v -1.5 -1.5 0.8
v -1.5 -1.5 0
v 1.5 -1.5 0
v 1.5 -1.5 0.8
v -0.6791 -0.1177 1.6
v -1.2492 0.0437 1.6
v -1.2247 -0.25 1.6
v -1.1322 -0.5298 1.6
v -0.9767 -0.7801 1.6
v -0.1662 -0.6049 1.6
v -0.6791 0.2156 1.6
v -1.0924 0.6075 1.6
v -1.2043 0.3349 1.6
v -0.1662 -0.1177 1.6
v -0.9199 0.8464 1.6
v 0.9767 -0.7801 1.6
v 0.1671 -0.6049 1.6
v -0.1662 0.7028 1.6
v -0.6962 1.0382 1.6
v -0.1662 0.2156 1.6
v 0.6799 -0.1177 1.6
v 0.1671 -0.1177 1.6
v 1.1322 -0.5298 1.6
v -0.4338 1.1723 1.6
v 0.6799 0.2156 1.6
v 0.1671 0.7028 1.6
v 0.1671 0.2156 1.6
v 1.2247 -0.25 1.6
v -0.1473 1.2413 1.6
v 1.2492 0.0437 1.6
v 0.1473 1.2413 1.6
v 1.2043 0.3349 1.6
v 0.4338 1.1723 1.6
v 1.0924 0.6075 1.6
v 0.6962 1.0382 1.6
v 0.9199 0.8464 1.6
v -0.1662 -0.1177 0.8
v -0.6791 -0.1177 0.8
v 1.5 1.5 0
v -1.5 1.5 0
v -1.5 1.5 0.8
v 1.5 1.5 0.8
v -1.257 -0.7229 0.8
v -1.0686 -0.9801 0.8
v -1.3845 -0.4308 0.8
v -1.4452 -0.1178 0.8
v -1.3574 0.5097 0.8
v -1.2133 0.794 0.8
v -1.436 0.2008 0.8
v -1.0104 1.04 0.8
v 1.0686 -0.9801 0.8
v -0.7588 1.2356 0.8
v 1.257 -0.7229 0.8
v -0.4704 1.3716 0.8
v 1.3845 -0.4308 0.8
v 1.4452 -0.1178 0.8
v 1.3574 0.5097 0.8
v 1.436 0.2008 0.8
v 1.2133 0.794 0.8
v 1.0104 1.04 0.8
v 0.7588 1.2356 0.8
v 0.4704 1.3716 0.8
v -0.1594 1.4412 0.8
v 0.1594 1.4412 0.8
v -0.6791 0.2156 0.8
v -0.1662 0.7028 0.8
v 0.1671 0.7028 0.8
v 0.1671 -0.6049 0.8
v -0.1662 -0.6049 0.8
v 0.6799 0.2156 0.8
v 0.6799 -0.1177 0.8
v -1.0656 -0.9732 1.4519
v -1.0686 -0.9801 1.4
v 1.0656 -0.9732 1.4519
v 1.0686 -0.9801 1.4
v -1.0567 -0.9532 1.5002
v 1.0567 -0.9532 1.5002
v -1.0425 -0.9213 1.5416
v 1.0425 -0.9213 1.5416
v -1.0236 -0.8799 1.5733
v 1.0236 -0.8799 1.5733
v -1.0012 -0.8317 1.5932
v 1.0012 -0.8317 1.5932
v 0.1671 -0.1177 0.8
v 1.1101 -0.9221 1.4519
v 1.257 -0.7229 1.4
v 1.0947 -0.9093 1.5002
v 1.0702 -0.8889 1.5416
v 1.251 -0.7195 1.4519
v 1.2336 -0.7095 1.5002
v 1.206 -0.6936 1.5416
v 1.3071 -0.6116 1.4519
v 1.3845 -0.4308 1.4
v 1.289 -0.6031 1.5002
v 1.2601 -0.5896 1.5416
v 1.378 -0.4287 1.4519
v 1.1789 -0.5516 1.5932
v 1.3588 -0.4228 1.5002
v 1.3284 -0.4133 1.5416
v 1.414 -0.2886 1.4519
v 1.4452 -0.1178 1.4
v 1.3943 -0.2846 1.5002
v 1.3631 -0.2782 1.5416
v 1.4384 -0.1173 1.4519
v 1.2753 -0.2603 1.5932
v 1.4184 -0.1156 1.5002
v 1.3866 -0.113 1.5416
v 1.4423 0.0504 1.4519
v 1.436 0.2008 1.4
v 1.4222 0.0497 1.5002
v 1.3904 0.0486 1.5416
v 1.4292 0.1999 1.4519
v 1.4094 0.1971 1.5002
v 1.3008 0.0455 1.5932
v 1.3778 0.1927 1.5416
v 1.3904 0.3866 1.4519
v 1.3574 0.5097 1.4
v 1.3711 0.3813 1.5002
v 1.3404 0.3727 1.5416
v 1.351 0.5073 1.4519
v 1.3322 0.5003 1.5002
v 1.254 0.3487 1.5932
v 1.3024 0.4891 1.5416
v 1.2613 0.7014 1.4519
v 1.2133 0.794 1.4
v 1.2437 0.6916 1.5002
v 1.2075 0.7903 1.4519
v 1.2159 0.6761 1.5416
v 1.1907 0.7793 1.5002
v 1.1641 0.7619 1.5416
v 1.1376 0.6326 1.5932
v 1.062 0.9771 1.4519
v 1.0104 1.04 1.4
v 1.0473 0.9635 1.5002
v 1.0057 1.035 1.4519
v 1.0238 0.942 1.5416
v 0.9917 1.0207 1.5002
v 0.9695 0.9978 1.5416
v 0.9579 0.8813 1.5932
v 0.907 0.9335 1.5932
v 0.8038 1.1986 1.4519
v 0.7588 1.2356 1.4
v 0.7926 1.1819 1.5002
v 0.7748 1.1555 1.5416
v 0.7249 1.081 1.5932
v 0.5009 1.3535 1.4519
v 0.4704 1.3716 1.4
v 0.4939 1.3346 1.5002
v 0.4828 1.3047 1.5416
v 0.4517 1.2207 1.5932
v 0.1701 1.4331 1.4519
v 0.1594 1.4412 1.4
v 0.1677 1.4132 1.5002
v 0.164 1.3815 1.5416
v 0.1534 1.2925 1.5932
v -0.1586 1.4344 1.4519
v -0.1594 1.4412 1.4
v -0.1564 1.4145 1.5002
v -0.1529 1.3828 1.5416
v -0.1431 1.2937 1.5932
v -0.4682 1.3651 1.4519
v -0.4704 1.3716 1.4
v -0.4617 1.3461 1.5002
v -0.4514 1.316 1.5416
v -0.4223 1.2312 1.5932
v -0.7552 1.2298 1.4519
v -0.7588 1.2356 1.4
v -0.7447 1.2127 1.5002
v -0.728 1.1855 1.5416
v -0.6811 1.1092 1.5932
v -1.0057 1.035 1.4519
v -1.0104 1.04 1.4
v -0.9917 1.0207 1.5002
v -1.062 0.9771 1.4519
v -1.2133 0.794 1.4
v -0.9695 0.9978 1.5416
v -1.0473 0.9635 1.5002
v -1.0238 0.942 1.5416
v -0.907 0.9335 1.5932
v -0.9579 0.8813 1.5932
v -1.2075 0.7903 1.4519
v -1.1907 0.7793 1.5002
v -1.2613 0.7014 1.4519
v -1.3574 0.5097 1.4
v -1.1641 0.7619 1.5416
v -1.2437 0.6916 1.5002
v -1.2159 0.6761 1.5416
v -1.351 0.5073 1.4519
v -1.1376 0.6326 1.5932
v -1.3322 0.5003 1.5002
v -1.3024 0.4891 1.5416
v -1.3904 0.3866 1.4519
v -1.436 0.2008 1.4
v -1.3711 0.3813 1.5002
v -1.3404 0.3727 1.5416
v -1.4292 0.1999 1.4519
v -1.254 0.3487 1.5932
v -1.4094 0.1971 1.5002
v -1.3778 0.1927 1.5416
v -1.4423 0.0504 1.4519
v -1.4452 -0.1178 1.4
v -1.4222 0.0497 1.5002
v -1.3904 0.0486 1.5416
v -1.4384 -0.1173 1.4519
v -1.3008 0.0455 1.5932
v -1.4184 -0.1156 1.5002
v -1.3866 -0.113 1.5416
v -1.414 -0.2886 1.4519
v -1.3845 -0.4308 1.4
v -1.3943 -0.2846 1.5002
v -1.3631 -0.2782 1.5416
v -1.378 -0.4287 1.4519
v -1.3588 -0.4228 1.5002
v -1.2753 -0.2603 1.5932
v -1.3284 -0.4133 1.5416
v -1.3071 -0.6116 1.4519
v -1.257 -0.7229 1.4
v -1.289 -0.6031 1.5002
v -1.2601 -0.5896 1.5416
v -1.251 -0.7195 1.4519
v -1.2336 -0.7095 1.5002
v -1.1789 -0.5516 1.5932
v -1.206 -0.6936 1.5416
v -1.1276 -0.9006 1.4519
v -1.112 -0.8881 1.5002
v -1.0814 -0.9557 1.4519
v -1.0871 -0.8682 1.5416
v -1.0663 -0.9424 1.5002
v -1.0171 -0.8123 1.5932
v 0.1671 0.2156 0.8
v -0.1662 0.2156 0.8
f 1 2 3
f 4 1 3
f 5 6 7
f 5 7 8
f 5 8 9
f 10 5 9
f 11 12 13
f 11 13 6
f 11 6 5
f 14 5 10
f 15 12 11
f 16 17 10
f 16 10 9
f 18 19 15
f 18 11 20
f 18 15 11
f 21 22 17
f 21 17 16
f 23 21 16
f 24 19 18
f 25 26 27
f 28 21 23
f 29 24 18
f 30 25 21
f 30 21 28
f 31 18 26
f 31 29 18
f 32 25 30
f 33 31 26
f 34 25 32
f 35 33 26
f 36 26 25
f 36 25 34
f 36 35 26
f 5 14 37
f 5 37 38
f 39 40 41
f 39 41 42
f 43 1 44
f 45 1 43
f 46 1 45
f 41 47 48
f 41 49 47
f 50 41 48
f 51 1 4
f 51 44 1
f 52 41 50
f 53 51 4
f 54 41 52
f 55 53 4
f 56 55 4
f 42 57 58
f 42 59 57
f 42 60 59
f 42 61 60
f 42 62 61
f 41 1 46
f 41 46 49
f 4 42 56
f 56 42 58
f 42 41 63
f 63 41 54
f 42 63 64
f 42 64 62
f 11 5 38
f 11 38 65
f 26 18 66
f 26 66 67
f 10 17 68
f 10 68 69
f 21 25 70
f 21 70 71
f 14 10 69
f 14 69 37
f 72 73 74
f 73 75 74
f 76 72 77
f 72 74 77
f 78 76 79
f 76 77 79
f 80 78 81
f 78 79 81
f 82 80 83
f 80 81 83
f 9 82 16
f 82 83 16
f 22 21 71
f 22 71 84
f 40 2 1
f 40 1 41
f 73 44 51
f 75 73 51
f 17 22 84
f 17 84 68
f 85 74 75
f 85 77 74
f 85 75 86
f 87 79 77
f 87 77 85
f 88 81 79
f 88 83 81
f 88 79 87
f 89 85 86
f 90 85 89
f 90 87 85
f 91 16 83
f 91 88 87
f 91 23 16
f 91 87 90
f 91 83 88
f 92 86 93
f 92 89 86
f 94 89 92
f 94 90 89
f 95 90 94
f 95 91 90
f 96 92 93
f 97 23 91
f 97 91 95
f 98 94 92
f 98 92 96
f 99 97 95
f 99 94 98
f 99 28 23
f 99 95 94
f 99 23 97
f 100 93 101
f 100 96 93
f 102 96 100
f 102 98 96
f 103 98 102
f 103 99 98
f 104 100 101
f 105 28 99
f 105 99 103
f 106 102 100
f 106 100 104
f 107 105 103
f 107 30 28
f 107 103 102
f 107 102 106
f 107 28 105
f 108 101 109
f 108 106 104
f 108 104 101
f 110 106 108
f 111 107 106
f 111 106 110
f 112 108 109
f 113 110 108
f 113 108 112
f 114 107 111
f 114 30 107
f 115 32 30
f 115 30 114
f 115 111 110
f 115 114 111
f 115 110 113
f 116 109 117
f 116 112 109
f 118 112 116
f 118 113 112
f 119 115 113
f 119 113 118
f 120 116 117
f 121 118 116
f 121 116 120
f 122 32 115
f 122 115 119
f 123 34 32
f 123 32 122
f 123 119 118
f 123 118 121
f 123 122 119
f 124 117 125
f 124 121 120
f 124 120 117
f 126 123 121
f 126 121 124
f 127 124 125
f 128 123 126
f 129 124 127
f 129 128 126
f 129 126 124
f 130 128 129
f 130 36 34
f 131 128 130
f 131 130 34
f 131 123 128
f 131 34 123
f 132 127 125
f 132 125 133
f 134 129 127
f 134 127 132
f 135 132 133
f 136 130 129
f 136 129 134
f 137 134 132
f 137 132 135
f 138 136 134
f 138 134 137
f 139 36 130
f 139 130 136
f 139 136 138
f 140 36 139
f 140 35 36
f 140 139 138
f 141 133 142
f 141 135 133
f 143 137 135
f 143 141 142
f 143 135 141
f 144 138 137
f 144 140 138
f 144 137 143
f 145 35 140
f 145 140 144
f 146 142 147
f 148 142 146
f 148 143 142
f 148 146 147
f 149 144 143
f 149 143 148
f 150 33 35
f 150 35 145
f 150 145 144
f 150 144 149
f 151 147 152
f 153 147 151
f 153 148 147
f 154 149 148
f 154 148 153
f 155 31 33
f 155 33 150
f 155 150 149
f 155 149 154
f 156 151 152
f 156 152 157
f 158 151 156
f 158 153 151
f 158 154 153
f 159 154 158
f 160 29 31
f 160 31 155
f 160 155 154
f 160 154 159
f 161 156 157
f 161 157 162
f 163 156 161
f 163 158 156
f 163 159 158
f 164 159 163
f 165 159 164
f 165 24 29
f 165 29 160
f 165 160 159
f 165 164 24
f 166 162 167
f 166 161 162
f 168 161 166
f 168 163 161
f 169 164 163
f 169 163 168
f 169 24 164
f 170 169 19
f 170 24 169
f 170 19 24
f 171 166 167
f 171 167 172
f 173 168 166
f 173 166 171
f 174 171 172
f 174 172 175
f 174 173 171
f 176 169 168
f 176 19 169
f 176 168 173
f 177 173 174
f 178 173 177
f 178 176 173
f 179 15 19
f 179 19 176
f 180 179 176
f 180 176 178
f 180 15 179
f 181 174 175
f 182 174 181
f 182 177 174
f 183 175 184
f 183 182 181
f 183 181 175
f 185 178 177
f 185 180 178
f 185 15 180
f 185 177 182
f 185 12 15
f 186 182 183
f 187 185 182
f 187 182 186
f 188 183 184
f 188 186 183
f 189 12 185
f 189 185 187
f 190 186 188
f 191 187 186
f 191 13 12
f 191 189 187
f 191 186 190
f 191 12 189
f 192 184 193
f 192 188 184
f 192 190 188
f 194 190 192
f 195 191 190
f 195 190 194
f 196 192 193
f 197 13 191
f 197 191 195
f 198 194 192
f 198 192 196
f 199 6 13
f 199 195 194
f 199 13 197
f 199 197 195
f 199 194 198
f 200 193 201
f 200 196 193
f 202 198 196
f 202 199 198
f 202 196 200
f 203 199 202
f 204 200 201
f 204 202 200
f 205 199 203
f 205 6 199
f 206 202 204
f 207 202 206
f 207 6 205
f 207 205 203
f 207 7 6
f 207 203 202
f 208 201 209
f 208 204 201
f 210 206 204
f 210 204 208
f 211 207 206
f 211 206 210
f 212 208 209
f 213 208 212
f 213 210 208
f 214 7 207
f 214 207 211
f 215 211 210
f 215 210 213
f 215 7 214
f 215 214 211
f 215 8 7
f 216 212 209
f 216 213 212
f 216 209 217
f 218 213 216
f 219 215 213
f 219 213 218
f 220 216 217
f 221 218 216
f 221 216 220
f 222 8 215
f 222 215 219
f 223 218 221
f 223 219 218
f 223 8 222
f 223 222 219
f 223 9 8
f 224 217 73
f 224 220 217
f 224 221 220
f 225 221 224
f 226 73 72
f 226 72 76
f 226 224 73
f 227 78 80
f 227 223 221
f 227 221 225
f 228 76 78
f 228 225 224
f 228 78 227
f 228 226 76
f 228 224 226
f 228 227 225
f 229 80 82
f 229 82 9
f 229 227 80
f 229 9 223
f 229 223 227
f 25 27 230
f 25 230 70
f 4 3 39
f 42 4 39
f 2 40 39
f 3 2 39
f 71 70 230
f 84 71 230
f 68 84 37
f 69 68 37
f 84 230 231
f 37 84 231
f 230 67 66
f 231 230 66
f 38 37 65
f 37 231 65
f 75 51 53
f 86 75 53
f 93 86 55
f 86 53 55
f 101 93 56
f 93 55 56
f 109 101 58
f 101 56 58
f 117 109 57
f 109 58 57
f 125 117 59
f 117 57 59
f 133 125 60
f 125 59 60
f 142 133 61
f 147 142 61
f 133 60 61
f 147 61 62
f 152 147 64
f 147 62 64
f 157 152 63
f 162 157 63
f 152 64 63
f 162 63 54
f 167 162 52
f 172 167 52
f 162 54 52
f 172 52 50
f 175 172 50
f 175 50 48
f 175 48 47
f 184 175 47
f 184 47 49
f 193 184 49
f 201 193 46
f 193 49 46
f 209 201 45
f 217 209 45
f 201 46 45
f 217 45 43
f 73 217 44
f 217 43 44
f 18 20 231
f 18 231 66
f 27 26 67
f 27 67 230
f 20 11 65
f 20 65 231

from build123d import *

# Parameters (mm, degrees)
SKETCH1_W           = 3
SKETCH1_H           = 3
BOSS_EXTRUDE1_DEPTH = 0.8
BOSS_EXTRUDE2_DEPTH = 0.8
CUT_EXTRUDE1_DEPTH  = 0.8
FILLET1_R           = 0.2


with BuildPart() as part:
    # Sketch1 → Boss-Extrude1 (new body)
    with BuildSketch(Plane.XY):
        Rectangle(SKETCH1_W, SKETCH1_H)
    extrude(amount=BOSS_EXTRUDE1_DEPTH)

    # Sketch2 → Boss-Extrude2 (add)
    with BuildSketch(Plane.XY.offset(0.8)):
        with BuildLine():
            Line((-1.068624141, -0.980072674), (1.068624141, -0.980072674))
            ThreePointArc((1.068624141, -0.980072674), (0, 1.45), (-1.068624141, -0.980072674))
        make_face()
    extrude(amount=BOSS_EXTRUDE2_DEPTH)

    # Sketch3 → Cut-Extrude1 (cut)
    with BuildSketch(Plane.XY.offset(1.6)):
        Polygon((-0.166229868, 0.215595899), (-0.166229868, 0.702775387), (0.167103465, 0.702775387), (0.167103465, 0.215595899), (0.679923978, 0.215595899), (0.679923978, -0.117737434), (0.167103465, -0.117737434), (0.167103465, -0.604916921), (-0.166229868, -0.604916921), (-0.166229868, -0.117737434), (-0.679050381, -0.117737434), (-0.679050381, 0.215595899), align=None)
    extrude(amount=-CUT_EXTRUDE1_DEPTH, mode=Mode.SUBTRACT)

    # Fillet1
    fillet1_edges = [part.edges().sort_by_distance(p)[0] for p in [
        (0, 1.45, 1.6),
        (0, -0.980072674, 1.6),
    ]]
    fillet(fillet1_edges, radius=FILLET1_R)


solid = part.part
